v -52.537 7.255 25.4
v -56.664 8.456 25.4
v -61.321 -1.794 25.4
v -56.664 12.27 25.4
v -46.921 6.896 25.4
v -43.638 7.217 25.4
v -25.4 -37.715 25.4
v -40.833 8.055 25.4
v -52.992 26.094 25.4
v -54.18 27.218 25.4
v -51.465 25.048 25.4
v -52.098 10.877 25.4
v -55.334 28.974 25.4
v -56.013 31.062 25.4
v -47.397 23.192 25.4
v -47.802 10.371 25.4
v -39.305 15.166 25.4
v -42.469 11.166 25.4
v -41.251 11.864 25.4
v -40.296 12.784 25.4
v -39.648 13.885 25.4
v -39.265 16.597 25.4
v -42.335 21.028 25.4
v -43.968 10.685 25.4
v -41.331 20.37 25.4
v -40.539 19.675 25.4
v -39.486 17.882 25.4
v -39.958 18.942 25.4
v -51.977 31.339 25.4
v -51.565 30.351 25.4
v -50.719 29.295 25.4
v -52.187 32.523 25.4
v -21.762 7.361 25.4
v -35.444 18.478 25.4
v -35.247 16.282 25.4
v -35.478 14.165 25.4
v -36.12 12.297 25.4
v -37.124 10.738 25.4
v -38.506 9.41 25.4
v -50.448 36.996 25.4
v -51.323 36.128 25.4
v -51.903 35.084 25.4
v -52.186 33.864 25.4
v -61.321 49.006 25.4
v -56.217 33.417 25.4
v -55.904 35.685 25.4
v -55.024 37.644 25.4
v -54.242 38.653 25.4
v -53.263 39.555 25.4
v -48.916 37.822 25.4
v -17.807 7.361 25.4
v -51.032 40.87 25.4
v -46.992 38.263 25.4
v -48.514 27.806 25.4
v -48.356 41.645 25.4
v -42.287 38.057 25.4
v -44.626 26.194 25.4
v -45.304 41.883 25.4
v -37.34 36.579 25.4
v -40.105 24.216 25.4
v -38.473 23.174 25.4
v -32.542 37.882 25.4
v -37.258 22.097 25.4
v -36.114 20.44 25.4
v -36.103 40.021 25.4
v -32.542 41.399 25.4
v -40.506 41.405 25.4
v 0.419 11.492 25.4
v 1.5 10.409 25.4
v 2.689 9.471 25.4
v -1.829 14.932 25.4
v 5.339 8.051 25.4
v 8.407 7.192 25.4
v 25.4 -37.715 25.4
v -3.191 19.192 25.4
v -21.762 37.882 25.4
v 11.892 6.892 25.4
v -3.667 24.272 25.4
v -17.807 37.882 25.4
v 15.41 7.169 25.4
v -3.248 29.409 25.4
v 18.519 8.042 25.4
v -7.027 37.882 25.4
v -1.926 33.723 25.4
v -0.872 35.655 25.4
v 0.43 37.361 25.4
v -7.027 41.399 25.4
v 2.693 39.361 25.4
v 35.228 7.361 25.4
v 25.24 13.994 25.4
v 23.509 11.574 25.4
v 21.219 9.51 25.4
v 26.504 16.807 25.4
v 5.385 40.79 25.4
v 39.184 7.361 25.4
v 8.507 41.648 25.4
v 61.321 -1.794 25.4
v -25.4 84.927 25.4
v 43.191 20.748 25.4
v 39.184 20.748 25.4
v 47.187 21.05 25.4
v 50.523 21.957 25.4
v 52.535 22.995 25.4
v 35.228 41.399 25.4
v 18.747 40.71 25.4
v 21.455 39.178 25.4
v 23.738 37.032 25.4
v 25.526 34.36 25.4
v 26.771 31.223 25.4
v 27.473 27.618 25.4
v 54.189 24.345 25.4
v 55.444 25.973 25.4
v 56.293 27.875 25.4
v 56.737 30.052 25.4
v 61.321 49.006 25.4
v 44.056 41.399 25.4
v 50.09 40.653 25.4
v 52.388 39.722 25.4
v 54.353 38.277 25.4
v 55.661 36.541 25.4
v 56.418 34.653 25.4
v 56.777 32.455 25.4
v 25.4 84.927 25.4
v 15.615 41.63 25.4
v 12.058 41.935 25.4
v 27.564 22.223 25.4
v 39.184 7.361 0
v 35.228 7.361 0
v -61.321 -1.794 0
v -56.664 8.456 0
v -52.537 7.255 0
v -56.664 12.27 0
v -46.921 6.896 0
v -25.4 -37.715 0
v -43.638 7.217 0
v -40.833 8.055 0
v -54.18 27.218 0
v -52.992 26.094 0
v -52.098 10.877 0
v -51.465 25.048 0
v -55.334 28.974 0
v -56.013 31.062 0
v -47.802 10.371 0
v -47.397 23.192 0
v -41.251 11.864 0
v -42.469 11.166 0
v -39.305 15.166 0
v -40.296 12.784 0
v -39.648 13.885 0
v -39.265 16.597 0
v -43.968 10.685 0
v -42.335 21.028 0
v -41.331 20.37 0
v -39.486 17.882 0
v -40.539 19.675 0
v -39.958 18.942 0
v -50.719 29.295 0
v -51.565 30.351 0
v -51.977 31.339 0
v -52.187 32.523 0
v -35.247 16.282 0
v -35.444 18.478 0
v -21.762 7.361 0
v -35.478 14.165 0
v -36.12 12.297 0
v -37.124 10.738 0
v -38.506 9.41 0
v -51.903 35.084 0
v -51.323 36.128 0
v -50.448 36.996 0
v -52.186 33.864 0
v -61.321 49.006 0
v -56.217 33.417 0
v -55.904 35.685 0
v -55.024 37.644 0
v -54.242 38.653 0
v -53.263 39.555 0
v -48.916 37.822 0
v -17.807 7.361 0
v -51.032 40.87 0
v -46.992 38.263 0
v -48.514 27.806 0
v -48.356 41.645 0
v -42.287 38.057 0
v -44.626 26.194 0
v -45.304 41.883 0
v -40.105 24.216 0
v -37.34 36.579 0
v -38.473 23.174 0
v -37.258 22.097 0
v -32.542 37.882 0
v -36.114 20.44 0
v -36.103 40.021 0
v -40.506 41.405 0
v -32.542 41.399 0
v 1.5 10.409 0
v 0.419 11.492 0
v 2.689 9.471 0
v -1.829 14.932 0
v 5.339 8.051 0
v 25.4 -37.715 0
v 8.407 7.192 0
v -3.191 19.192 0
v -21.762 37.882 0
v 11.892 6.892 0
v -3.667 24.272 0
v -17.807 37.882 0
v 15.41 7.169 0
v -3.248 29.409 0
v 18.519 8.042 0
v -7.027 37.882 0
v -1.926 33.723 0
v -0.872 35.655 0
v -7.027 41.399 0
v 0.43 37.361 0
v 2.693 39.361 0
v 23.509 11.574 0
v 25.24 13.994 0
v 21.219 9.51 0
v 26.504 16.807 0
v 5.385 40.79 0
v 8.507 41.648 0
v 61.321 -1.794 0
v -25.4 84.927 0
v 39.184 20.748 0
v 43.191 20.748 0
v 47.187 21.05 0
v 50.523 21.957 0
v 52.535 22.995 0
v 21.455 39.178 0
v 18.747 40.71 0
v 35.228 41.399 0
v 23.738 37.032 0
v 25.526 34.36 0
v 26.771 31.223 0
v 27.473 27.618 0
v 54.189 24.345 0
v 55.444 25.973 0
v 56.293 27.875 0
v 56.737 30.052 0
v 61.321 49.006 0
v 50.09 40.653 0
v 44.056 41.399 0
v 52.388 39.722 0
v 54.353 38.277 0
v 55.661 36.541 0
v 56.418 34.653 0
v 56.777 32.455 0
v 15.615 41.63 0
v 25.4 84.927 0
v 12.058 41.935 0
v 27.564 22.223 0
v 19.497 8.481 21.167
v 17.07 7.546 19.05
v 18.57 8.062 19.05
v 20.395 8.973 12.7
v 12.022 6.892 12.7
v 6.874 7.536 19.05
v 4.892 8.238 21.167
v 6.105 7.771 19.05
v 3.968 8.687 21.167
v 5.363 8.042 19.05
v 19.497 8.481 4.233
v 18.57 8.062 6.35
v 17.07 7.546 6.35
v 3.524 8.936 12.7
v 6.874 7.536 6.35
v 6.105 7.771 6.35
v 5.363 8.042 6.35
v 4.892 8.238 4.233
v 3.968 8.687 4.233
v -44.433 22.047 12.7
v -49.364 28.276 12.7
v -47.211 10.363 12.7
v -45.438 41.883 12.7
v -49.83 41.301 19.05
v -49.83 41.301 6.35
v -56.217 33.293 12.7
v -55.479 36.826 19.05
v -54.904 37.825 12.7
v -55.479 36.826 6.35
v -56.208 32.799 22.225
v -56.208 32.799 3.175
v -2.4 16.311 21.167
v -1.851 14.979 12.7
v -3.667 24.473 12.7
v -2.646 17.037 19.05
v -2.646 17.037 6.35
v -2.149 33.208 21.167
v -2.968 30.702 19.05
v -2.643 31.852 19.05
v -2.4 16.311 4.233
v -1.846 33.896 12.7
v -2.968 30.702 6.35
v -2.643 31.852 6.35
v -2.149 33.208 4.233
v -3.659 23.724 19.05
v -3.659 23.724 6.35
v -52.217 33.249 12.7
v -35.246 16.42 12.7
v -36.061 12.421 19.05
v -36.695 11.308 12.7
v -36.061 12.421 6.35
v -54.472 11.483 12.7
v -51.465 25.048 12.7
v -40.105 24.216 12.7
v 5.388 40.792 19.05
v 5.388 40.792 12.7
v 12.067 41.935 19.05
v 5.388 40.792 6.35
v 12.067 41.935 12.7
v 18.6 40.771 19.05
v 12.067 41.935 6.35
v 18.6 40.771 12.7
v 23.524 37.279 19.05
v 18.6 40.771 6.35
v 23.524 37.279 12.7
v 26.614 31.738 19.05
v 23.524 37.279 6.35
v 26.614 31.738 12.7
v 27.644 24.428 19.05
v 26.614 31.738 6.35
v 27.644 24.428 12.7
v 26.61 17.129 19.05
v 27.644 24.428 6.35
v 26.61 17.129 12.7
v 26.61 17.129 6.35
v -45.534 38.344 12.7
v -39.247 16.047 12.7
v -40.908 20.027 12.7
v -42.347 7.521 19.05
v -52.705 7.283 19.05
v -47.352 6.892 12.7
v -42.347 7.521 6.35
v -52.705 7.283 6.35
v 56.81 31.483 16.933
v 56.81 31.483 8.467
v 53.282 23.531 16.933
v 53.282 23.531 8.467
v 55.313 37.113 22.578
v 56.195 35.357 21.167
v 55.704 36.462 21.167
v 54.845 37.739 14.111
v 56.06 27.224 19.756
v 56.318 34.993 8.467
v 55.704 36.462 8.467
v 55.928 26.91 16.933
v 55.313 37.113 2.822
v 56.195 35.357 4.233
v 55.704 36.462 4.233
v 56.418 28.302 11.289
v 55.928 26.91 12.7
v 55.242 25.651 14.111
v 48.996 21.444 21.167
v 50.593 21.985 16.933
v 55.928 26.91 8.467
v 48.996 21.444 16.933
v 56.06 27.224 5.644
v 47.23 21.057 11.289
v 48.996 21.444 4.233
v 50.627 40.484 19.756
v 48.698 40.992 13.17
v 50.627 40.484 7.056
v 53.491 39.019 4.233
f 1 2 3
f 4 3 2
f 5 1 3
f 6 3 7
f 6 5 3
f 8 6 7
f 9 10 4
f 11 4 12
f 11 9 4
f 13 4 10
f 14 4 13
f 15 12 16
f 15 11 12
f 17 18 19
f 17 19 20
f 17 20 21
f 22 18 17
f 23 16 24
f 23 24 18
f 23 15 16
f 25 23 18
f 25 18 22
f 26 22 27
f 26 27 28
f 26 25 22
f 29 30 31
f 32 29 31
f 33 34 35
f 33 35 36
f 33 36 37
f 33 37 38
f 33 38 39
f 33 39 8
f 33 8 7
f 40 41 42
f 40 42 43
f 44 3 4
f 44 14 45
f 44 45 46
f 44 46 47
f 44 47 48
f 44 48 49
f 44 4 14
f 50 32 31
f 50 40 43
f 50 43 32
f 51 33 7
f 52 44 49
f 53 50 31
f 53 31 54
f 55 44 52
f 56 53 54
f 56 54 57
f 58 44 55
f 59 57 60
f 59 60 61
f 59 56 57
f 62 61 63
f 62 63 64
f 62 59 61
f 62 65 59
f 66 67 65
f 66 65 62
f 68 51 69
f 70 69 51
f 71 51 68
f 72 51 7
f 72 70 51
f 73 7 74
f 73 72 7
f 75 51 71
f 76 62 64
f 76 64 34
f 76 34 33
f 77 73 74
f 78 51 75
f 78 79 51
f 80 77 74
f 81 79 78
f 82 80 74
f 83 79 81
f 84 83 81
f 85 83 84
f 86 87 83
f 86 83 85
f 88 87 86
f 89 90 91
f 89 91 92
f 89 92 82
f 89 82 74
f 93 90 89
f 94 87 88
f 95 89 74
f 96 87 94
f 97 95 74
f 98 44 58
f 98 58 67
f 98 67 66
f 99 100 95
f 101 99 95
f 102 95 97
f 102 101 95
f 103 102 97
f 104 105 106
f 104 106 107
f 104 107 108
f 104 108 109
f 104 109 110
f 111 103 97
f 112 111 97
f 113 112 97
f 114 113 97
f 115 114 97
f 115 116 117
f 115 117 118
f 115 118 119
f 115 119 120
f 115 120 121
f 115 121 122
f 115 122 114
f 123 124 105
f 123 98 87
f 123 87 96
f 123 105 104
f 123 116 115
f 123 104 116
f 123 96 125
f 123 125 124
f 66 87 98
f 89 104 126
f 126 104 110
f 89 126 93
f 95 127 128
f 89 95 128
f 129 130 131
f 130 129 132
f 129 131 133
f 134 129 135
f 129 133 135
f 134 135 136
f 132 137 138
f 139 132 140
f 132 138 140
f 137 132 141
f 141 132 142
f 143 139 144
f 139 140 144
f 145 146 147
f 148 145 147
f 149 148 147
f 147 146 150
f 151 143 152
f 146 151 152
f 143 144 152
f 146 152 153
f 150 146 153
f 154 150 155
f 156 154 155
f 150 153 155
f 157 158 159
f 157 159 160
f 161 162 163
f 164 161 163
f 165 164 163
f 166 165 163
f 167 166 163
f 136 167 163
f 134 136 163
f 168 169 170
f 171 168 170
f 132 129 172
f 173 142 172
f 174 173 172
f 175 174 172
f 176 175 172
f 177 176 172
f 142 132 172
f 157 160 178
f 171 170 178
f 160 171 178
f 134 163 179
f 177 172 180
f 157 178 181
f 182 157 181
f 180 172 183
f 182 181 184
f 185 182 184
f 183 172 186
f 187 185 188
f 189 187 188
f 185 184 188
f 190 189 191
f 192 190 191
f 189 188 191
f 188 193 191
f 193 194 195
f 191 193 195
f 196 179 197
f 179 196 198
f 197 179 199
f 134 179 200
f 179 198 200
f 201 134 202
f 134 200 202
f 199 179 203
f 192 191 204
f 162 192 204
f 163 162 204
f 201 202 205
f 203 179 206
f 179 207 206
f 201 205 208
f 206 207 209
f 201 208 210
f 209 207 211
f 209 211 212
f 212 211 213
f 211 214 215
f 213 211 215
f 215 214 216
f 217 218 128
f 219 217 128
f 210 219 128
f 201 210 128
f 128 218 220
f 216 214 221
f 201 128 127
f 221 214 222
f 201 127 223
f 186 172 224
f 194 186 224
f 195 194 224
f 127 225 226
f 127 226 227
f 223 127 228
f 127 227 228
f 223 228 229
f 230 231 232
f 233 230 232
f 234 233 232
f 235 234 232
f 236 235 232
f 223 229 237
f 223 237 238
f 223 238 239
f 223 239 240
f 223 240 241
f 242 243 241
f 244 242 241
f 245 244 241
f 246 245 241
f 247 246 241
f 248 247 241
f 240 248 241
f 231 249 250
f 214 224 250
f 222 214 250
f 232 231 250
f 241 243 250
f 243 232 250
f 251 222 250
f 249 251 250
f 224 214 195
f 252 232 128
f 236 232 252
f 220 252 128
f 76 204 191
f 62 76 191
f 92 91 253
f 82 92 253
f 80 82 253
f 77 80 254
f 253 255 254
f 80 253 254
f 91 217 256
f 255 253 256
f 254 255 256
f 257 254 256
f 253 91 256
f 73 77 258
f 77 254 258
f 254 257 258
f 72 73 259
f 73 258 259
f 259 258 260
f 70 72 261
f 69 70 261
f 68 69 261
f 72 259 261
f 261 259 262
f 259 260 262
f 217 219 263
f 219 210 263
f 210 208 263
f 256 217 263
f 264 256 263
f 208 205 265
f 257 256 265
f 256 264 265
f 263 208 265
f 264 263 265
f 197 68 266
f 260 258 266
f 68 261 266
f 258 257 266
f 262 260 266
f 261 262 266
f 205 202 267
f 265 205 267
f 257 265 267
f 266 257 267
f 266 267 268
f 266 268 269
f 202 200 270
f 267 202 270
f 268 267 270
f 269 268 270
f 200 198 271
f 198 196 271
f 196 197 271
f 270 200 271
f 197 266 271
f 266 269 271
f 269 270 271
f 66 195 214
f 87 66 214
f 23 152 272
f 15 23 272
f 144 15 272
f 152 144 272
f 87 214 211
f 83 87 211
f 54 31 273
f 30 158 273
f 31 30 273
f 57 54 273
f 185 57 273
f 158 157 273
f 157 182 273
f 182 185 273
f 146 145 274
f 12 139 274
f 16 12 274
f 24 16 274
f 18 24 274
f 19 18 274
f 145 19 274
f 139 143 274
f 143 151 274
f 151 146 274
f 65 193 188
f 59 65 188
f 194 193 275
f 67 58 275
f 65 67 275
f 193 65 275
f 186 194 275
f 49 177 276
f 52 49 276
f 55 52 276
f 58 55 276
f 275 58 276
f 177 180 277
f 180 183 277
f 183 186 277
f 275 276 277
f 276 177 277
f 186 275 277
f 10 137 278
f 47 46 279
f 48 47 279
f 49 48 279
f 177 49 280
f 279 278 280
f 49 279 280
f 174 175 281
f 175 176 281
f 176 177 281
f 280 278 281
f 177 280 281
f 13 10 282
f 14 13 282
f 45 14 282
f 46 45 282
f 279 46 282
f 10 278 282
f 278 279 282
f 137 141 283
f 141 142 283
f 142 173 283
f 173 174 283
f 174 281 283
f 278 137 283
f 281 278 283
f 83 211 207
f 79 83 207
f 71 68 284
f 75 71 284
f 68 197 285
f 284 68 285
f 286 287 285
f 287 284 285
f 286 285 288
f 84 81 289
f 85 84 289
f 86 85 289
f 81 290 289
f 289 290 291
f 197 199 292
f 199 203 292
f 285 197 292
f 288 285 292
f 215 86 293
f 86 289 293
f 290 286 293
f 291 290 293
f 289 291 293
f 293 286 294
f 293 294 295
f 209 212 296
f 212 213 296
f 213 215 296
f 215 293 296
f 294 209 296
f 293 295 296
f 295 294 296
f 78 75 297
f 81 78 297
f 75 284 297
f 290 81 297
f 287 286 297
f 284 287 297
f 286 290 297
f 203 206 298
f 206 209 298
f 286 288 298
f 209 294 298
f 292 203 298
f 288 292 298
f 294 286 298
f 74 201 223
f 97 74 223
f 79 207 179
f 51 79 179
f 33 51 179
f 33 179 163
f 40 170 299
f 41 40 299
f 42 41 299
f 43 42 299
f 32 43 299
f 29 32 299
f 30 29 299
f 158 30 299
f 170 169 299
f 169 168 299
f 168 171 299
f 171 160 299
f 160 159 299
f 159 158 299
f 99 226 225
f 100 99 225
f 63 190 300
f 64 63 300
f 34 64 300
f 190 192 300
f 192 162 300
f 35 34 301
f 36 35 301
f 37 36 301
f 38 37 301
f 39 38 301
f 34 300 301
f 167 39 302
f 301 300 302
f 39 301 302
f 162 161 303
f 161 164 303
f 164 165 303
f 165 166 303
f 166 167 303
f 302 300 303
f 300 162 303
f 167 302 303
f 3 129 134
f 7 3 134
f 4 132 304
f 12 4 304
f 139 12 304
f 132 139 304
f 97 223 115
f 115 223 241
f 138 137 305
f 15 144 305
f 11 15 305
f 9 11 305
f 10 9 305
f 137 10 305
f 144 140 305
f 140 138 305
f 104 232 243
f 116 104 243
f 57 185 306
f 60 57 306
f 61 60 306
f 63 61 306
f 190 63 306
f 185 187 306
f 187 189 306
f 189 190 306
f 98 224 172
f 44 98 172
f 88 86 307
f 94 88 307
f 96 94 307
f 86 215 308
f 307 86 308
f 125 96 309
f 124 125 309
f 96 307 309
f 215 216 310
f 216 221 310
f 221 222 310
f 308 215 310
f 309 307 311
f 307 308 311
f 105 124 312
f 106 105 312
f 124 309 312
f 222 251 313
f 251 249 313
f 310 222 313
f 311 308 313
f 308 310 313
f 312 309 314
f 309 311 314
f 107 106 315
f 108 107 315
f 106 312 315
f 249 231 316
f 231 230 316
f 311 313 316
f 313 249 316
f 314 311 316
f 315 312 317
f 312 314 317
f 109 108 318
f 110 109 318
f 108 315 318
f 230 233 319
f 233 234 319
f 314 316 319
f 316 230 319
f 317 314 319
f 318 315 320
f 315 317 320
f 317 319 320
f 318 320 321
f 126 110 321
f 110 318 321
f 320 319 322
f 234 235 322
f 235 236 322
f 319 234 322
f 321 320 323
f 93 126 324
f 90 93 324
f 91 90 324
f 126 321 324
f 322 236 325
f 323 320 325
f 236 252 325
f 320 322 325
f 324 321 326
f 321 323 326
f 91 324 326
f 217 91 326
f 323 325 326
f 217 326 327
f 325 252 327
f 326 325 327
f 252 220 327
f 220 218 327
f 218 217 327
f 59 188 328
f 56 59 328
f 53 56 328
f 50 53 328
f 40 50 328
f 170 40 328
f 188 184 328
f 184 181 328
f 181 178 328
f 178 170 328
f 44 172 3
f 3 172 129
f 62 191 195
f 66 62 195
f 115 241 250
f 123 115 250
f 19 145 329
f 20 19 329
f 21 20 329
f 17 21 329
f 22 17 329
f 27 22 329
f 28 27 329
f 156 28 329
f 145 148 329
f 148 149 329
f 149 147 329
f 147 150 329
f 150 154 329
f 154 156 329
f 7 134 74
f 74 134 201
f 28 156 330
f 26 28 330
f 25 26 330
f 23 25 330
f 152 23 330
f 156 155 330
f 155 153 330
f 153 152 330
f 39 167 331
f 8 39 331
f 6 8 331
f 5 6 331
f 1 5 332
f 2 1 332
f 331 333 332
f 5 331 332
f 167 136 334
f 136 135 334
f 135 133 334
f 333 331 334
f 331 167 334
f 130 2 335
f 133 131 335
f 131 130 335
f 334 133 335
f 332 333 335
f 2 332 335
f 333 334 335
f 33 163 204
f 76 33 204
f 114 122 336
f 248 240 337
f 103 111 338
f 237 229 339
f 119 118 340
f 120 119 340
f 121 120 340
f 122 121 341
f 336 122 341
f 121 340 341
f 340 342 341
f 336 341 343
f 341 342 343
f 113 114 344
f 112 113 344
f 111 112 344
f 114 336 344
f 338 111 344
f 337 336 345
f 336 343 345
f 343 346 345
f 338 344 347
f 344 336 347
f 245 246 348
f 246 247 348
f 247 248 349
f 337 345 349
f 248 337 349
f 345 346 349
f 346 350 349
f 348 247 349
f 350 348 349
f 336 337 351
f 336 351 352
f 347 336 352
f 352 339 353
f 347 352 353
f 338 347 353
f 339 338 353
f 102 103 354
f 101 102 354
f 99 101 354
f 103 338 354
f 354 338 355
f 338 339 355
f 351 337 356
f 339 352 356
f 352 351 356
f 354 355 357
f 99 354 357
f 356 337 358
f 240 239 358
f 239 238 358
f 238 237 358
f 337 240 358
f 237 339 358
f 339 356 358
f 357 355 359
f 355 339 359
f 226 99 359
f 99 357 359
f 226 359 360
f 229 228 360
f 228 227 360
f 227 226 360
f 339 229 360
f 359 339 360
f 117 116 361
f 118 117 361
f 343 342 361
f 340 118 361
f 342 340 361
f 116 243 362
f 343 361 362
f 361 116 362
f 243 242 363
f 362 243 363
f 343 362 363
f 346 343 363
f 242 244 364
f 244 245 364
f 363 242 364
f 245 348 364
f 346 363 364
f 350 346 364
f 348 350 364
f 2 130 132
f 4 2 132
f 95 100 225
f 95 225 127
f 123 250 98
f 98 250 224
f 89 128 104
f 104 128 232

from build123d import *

# Parameters (mm, degrees)
F1_DEPTH = 25.4


with BuildPart() as f1:
    # F0 (on Top) → F1 (new body)
    with BuildSketch(Plane.XY):
        Polygon((-25.4, -37.7151333554), (25.4, -37.7151333554), (61.3210244843, -1.7941088711), (61.3210244843, 49.0058911289), (25.4, 84.9269156132), (-25.4, 84.9269156132), (-61.3210244843, 49.0058911289), (-61.3210244843, -1.7941088711), align=None)
        with BuildLine():
            add(Edge.make_bspline(
                [(-37.2578142017, 22.0965334461), (-35.2463953643, 19.9063218232), (-35.2463953643, 16.4198625051)],
                knots=[0, 0, 0, 1, 1, 1], degree=2))
            add(Edge.make_bspline(
                [(-35.2463953643, 16.4198625051), (-35.2463953643, 11.9276937683), (-38.5056388508, 9.4096953719)],
                knots=[0, 0, 0, 1, 1, 1], degree=2))
            add(Edge.make_bspline(
                [(-38.5056388508, 9.4096953719), (-41.7648823372, 6.8916969755), (-47.3521568855, 6.8916969755)],
                knots=[0, 0, 0, 1, 1, 1], degree=2))
            add(Edge.make_bspline(
                [(-47.3521568855, 6.8916969755), (-53.4013127963, 6.8916969755), (-56.6642811325, 8.456133849)],
                knots=[0, 0, 0, 1, 1, 1], degree=2))
            Line((-56.6642811325, 8.456133849), (-56.6642811325, 12.2703799406))
            add(Edge.make_bspline(
                [(-56.6642811325, 12.2703799406), (-54.5634659023, 11.3913154117), (-52.0976154017, 10.8772861533)],
                knots=[0, 0, 0, 1, 1, 1], degree=2))
            add(Edge.make_bspline(
                [(-52.0976154017, 10.8772861533), (-49.6317649011, 10.3632568948), (-47.2106125969, 10.3632568948)],
                knots=[0, 0, 0, 1, 1, 1], degree=2))
            add(Edge.make_bspline(
                [(-47.2106125969, 10.3632568948), (-43.2548222168, 10.3632568948), (-41.2508530788, 11.8643713235)],
                knots=[0, 0, 0, 1, 1, 1], degree=2))
            add(Edge.make_bspline(
                [(-41.2508530788, 11.8643713235), (-39.2468839409, 13.3654857521), (-39.2468839409, 16.0473775352)],
                knots=[0, 0, 0, 1, 1, 1], degree=2))
            add(Edge.make_bspline(
                [(-39.2468839409, 16.0473775352), (-39.2468839409, 17.8129562924), (-39.9583302333, 18.9415857512)],
                knots=[0, 0, 0, 1, 1, 1], degree=2))
            add(Edge.make_bspline(
                [(-39.9583302333, 18.9415857512), (-40.6697765258, 20.0702152099), (-42.3347843412, 21.0275015825)],
                knots=[0, 0, 0, 1, 1, 1], degree=2))
            add(Edge.make_bspline(
                [(-42.3347843412, 21.0275015825), (-43.9997921565, 21.9847879551), (-47.3968550818, 23.1916392575)],
                knots=[0, 0, 0, 1, 1, 1], degree=2))
            add(Edge.make_bspline(
                [(-47.3968550818, 23.1916392575), (-52.1423135981, 24.8901707202), (-54.1798063834, 27.2182017819)],
                knots=[0, 0, 0, 1, 1, 1], degree=2))
            add(Edge.make_bspline(
                [(-54.1798063834, 27.2182017819), (-56.2172991686, 29.5462328437), (-56.2172991686, 33.2934316407)],
                knots=[0, 0, 0, 1, 1, 1], degree=2))
            add(Edge.make_bspline(
                [(-56.2172991686, 33.2934316407), (-56.2172991686, 37.2268729226), (-53.2634933575, 39.5549039844)],
                knots=[0, 0, 0, 1, 1, 1], degree=2))
            add(Edge.make_bspline(
                [(-53.2634933575, 39.5549039844), (-50.3096875463, 41.8829350461), (-45.4375841403, 41.8829350461)],
                knots=[0, 0, 0, 1, 1, 1], degree=2))
            add(Edge.make_bspline(
                [(-45.4375841403, 41.8829350461), (-40.3643388505, 41.8829350461), (-36.1031107951, 40.0205101967)],
                knots=[0, 0, 0, 1, 1, 1], degree=2))
            Line((-36.1031107951, 40.0205101967), (-37.3397608951, 36.578749075))
            add(Edge.make_bspline(
                [(-37.3397608951, 36.578749075), (-41.5562907541, 38.3443278323), (-45.5344302324, 38.3443278323)],
                knots=[0, 0, 0, 1, 1, 1], degree=2))
            add(Edge.make_bspline(
                [(-45.5344302324, 38.3443278323), (-48.6782033782, 38.3443278323), (-50.4475069852, 36.9959322413)],
                knots=[0, 0, 0, 1, 1, 1], degree=2))
            add(Edge.make_bspline(
                [(-50.4475069852, 36.9959322413), (-52.2168105921, 35.6475366503), (-52.2168105921, 33.2487334443)],
                knots=[0, 0, 0, 1, 1, 1], degree=2))
            add(Edge.make_bspline(
                [(-52.2168105921, 33.2487334443), (-52.2168105921, 31.4831546871), (-51.5649618948, 30.3508003786)],
                knots=[0, 0, 0, 1, 1, 1], degree=2))
            add(Edge.make_bspline(
                [(-51.5649618948, 30.3508003786), (-50.9131131975, 29.2184460702), (-49.3635757228, 28.2760590964)],
                knots=[0, 0, 0, 1, 1, 1], degree=2))
            add(Edge.make_bspline(
                [(-49.3635757228, 28.2760590964), (-47.8140382481, 27.3336721226), (-44.6255669059, 26.1938681148)],
                knots=[0, 0, 0, 1, 1, 1], degree=2))
            add(Edge.make_bspline(
                [(-44.6255669059, 26.1938681148), (-39.269233039, 24.286745069), (-37.2578142017, 22.0965334461)],
                knots=[0, 0, 0, 1, 1, 1], degree=2))
        make_face(mode=Mode.SUBTRACT)
        Polygon((-17.8066490745, 37.8824464696), (-17.8066490745, 7.3610280376), (-21.7624394547, 7.3610280376), (-21.7624394547, 37.8824464696), (-32.542154483, 37.8824464696), (-32.542154483, 41.3987045853), (-7.0269340462, 41.3987045853), (-7.0269340462, 37.8824464696), align=None, mode=Mode.SUBTRACT)
        with BuildLine():
            add(Edge.make_bspline(
                [(23.5242831834, 37.2790208184), (27.6439669503, 32.6229586949), (27.6439669503, 24.4282893575)],
                knots=[0, 0, 0, 1, 1, 1], degree=2))
            add(Edge.make_bspline(
                [(27.6439669503, 24.4282893575), (27.6439669503, 16.2559691183), (23.5093837846, 11.5738330469)],
                knots=[0, 0, 0, 1, 1, 1], degree=2))
            add(Edge.make_bspline(
                [(23.5093837846, 11.5738330469), (19.374800619, 6.8916969755), (12.0219473135, 6.8916969755)],
                knots=[0, 0, 0, 1, 1, 1], degree=2))
            add(Edge.make_bspline(
                [(12.0219473135, 6.8916969755), (4.5052006213, 6.8916969755), (0.4190405017, 11.4918863536)],
                knots=[0, 0, 0, 1, 1, 1], degree=2))
            add(Edge.make_bspline(
                [(0.4190405017, 11.4918863536), (-3.6671196179, 16.0920757316), (-3.6671196179, 24.4729875539)],
                knots=[0, 0, 0, 1, 1, 1], degree=2))
            add(Edge.make_bspline(
                [(-3.6671196179, 24.4729875539), (-3.6671196179, 32.7868520816), (0.4302150508, 37.3609675118)],
                knots=[0, 0, 0, 1, 1, 1], degree=2))
            add(Edge.make_bspline(
                [(0.4302150508, 37.3609675118), (4.5275497195, 41.9350829419), (12.0666455099, 41.9350829419)],
                knots=[0, 0, 0, 1, 1, 1], degree=2))
            add(Edge.make_bspline(
                [(12.0666455099, 41.9350829419), (19.4045994165, 41.9350829419), (23.5242831834, 37.2790208184)],
                knots=[0, 0, 0, 1, 1, 1], degree=2))
        make_face(mode=Mode.SUBTRACT)
        with BuildLine():
            add(Edge.make_bspline(
                [(44.0556547232, 41.3987045853), (56.809540092, 41.3987045853), (56.809540092, 31.4831546871)],
                knots=[0, 0, 0, 1, 1, 1], degree=2))
            add(Edge.make_bspline(
                [(56.809540092, 31.4831546871), (56.809540092, 26.3130633051), (53.2821074272, 23.5306005801)],
                knots=[0, 0, 0, 1, 1, 1], degree=2))
            add(Edge.make_bspline(
                [(53.2821074272, 23.5306005801), (49.7546747624, 20.7481378551), (43.1914895931, 20.7481378551)],
                knots=[0, 0, 0, 1, 1, 1], degree=2))
            Line((43.1914895931, 20.7481378551), (39.1835513172, 20.7481378551))
            Line((39.1835513172, 20.7481378551), (39.1835513172, 7.3610280376))
            Line((39.1835513172, 7.3610280376), (35.2277609371, 7.3610280376))
            Line((35.2277609371, 7.3610280376), (35.2277609371, 41.3987045853))
            Line((35.2277609371, 41.3987045853), (44.0556547232, 41.3987045853))
        make_face(mode=Mode.SUBTRACT)
    extrude(amount=F1_DEPTH)


solid = f1.part
